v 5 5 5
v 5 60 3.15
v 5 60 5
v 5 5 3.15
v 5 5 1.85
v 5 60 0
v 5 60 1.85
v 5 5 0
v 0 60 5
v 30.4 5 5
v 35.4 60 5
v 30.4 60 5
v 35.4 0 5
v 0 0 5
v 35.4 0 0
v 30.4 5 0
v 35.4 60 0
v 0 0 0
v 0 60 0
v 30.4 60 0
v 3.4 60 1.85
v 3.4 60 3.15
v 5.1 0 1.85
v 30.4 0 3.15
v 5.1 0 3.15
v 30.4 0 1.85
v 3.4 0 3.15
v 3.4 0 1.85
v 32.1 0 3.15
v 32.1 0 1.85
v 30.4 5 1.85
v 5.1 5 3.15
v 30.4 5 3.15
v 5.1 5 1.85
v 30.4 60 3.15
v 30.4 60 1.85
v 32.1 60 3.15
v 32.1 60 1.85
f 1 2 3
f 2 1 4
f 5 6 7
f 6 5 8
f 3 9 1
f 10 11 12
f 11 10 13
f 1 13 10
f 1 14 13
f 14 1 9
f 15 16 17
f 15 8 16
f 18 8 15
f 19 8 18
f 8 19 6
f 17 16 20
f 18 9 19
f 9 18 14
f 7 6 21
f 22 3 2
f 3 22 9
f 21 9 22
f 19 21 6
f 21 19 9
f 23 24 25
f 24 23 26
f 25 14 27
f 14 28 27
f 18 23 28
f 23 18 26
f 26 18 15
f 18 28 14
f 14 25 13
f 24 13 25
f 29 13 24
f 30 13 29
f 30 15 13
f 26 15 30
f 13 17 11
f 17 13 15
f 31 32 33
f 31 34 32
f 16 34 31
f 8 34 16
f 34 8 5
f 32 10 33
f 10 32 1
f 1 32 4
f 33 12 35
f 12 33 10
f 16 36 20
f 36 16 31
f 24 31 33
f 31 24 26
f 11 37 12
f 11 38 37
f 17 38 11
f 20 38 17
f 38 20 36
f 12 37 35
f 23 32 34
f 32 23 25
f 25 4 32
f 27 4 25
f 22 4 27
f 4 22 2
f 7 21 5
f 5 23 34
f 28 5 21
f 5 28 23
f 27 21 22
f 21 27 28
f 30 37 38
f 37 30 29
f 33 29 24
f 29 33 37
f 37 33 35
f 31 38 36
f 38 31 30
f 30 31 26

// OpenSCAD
// Parameters
frame_width = 25.4 + 10;      // Total width of the frame
frame_height = 60;     // Height of the frame
frame_depth = 5;       // Depth (thickness) of the frame
beam_thickness = 5;    // Thickness of the frame beams
slit_depth = 1.5;         // Depth of the slit into the beams
slit_width = 1.1;         // Width of the slit (for the glass pane)
extra = 0.1;            // Small extension to avoid overlapping faces

// Main Module
difference() {
    frame();
    slits();
}

// Frame Module: Creates the U-shaped frame
module frame() {
    union() {
        // Left vertical beam
        cube([beam_thickness, frame_height, frame_depth]);
        
        // Bottom horizontal beam
        cube([frame_width, beam_thickness, frame_depth]);
        
        // Right vertical beam
        translate([frame_width - beam_thickness, 0, 0])
            cube([beam_thickness, frame_height, frame_depth]);
    }
}

// Slits Module: Creates the continuous slit along the inner faces
module slits() {
    // Left vertical beam slit
    translate([beam_thickness - slit_depth - extra, -extra, (frame_depth - slit_width)/2 - extra])
        cube([slit_depth + extra*2, frame_height + extra*2, slit_width + extra*2]);
    
    // Right vertical beam slit
    translate([frame_width - beam_thickness, -extra, (frame_depth - slit_width)/2 - extra])
        cube([slit_depth + extra*2, frame_height + extra*2, slit_width + extra*2]);
    
}
